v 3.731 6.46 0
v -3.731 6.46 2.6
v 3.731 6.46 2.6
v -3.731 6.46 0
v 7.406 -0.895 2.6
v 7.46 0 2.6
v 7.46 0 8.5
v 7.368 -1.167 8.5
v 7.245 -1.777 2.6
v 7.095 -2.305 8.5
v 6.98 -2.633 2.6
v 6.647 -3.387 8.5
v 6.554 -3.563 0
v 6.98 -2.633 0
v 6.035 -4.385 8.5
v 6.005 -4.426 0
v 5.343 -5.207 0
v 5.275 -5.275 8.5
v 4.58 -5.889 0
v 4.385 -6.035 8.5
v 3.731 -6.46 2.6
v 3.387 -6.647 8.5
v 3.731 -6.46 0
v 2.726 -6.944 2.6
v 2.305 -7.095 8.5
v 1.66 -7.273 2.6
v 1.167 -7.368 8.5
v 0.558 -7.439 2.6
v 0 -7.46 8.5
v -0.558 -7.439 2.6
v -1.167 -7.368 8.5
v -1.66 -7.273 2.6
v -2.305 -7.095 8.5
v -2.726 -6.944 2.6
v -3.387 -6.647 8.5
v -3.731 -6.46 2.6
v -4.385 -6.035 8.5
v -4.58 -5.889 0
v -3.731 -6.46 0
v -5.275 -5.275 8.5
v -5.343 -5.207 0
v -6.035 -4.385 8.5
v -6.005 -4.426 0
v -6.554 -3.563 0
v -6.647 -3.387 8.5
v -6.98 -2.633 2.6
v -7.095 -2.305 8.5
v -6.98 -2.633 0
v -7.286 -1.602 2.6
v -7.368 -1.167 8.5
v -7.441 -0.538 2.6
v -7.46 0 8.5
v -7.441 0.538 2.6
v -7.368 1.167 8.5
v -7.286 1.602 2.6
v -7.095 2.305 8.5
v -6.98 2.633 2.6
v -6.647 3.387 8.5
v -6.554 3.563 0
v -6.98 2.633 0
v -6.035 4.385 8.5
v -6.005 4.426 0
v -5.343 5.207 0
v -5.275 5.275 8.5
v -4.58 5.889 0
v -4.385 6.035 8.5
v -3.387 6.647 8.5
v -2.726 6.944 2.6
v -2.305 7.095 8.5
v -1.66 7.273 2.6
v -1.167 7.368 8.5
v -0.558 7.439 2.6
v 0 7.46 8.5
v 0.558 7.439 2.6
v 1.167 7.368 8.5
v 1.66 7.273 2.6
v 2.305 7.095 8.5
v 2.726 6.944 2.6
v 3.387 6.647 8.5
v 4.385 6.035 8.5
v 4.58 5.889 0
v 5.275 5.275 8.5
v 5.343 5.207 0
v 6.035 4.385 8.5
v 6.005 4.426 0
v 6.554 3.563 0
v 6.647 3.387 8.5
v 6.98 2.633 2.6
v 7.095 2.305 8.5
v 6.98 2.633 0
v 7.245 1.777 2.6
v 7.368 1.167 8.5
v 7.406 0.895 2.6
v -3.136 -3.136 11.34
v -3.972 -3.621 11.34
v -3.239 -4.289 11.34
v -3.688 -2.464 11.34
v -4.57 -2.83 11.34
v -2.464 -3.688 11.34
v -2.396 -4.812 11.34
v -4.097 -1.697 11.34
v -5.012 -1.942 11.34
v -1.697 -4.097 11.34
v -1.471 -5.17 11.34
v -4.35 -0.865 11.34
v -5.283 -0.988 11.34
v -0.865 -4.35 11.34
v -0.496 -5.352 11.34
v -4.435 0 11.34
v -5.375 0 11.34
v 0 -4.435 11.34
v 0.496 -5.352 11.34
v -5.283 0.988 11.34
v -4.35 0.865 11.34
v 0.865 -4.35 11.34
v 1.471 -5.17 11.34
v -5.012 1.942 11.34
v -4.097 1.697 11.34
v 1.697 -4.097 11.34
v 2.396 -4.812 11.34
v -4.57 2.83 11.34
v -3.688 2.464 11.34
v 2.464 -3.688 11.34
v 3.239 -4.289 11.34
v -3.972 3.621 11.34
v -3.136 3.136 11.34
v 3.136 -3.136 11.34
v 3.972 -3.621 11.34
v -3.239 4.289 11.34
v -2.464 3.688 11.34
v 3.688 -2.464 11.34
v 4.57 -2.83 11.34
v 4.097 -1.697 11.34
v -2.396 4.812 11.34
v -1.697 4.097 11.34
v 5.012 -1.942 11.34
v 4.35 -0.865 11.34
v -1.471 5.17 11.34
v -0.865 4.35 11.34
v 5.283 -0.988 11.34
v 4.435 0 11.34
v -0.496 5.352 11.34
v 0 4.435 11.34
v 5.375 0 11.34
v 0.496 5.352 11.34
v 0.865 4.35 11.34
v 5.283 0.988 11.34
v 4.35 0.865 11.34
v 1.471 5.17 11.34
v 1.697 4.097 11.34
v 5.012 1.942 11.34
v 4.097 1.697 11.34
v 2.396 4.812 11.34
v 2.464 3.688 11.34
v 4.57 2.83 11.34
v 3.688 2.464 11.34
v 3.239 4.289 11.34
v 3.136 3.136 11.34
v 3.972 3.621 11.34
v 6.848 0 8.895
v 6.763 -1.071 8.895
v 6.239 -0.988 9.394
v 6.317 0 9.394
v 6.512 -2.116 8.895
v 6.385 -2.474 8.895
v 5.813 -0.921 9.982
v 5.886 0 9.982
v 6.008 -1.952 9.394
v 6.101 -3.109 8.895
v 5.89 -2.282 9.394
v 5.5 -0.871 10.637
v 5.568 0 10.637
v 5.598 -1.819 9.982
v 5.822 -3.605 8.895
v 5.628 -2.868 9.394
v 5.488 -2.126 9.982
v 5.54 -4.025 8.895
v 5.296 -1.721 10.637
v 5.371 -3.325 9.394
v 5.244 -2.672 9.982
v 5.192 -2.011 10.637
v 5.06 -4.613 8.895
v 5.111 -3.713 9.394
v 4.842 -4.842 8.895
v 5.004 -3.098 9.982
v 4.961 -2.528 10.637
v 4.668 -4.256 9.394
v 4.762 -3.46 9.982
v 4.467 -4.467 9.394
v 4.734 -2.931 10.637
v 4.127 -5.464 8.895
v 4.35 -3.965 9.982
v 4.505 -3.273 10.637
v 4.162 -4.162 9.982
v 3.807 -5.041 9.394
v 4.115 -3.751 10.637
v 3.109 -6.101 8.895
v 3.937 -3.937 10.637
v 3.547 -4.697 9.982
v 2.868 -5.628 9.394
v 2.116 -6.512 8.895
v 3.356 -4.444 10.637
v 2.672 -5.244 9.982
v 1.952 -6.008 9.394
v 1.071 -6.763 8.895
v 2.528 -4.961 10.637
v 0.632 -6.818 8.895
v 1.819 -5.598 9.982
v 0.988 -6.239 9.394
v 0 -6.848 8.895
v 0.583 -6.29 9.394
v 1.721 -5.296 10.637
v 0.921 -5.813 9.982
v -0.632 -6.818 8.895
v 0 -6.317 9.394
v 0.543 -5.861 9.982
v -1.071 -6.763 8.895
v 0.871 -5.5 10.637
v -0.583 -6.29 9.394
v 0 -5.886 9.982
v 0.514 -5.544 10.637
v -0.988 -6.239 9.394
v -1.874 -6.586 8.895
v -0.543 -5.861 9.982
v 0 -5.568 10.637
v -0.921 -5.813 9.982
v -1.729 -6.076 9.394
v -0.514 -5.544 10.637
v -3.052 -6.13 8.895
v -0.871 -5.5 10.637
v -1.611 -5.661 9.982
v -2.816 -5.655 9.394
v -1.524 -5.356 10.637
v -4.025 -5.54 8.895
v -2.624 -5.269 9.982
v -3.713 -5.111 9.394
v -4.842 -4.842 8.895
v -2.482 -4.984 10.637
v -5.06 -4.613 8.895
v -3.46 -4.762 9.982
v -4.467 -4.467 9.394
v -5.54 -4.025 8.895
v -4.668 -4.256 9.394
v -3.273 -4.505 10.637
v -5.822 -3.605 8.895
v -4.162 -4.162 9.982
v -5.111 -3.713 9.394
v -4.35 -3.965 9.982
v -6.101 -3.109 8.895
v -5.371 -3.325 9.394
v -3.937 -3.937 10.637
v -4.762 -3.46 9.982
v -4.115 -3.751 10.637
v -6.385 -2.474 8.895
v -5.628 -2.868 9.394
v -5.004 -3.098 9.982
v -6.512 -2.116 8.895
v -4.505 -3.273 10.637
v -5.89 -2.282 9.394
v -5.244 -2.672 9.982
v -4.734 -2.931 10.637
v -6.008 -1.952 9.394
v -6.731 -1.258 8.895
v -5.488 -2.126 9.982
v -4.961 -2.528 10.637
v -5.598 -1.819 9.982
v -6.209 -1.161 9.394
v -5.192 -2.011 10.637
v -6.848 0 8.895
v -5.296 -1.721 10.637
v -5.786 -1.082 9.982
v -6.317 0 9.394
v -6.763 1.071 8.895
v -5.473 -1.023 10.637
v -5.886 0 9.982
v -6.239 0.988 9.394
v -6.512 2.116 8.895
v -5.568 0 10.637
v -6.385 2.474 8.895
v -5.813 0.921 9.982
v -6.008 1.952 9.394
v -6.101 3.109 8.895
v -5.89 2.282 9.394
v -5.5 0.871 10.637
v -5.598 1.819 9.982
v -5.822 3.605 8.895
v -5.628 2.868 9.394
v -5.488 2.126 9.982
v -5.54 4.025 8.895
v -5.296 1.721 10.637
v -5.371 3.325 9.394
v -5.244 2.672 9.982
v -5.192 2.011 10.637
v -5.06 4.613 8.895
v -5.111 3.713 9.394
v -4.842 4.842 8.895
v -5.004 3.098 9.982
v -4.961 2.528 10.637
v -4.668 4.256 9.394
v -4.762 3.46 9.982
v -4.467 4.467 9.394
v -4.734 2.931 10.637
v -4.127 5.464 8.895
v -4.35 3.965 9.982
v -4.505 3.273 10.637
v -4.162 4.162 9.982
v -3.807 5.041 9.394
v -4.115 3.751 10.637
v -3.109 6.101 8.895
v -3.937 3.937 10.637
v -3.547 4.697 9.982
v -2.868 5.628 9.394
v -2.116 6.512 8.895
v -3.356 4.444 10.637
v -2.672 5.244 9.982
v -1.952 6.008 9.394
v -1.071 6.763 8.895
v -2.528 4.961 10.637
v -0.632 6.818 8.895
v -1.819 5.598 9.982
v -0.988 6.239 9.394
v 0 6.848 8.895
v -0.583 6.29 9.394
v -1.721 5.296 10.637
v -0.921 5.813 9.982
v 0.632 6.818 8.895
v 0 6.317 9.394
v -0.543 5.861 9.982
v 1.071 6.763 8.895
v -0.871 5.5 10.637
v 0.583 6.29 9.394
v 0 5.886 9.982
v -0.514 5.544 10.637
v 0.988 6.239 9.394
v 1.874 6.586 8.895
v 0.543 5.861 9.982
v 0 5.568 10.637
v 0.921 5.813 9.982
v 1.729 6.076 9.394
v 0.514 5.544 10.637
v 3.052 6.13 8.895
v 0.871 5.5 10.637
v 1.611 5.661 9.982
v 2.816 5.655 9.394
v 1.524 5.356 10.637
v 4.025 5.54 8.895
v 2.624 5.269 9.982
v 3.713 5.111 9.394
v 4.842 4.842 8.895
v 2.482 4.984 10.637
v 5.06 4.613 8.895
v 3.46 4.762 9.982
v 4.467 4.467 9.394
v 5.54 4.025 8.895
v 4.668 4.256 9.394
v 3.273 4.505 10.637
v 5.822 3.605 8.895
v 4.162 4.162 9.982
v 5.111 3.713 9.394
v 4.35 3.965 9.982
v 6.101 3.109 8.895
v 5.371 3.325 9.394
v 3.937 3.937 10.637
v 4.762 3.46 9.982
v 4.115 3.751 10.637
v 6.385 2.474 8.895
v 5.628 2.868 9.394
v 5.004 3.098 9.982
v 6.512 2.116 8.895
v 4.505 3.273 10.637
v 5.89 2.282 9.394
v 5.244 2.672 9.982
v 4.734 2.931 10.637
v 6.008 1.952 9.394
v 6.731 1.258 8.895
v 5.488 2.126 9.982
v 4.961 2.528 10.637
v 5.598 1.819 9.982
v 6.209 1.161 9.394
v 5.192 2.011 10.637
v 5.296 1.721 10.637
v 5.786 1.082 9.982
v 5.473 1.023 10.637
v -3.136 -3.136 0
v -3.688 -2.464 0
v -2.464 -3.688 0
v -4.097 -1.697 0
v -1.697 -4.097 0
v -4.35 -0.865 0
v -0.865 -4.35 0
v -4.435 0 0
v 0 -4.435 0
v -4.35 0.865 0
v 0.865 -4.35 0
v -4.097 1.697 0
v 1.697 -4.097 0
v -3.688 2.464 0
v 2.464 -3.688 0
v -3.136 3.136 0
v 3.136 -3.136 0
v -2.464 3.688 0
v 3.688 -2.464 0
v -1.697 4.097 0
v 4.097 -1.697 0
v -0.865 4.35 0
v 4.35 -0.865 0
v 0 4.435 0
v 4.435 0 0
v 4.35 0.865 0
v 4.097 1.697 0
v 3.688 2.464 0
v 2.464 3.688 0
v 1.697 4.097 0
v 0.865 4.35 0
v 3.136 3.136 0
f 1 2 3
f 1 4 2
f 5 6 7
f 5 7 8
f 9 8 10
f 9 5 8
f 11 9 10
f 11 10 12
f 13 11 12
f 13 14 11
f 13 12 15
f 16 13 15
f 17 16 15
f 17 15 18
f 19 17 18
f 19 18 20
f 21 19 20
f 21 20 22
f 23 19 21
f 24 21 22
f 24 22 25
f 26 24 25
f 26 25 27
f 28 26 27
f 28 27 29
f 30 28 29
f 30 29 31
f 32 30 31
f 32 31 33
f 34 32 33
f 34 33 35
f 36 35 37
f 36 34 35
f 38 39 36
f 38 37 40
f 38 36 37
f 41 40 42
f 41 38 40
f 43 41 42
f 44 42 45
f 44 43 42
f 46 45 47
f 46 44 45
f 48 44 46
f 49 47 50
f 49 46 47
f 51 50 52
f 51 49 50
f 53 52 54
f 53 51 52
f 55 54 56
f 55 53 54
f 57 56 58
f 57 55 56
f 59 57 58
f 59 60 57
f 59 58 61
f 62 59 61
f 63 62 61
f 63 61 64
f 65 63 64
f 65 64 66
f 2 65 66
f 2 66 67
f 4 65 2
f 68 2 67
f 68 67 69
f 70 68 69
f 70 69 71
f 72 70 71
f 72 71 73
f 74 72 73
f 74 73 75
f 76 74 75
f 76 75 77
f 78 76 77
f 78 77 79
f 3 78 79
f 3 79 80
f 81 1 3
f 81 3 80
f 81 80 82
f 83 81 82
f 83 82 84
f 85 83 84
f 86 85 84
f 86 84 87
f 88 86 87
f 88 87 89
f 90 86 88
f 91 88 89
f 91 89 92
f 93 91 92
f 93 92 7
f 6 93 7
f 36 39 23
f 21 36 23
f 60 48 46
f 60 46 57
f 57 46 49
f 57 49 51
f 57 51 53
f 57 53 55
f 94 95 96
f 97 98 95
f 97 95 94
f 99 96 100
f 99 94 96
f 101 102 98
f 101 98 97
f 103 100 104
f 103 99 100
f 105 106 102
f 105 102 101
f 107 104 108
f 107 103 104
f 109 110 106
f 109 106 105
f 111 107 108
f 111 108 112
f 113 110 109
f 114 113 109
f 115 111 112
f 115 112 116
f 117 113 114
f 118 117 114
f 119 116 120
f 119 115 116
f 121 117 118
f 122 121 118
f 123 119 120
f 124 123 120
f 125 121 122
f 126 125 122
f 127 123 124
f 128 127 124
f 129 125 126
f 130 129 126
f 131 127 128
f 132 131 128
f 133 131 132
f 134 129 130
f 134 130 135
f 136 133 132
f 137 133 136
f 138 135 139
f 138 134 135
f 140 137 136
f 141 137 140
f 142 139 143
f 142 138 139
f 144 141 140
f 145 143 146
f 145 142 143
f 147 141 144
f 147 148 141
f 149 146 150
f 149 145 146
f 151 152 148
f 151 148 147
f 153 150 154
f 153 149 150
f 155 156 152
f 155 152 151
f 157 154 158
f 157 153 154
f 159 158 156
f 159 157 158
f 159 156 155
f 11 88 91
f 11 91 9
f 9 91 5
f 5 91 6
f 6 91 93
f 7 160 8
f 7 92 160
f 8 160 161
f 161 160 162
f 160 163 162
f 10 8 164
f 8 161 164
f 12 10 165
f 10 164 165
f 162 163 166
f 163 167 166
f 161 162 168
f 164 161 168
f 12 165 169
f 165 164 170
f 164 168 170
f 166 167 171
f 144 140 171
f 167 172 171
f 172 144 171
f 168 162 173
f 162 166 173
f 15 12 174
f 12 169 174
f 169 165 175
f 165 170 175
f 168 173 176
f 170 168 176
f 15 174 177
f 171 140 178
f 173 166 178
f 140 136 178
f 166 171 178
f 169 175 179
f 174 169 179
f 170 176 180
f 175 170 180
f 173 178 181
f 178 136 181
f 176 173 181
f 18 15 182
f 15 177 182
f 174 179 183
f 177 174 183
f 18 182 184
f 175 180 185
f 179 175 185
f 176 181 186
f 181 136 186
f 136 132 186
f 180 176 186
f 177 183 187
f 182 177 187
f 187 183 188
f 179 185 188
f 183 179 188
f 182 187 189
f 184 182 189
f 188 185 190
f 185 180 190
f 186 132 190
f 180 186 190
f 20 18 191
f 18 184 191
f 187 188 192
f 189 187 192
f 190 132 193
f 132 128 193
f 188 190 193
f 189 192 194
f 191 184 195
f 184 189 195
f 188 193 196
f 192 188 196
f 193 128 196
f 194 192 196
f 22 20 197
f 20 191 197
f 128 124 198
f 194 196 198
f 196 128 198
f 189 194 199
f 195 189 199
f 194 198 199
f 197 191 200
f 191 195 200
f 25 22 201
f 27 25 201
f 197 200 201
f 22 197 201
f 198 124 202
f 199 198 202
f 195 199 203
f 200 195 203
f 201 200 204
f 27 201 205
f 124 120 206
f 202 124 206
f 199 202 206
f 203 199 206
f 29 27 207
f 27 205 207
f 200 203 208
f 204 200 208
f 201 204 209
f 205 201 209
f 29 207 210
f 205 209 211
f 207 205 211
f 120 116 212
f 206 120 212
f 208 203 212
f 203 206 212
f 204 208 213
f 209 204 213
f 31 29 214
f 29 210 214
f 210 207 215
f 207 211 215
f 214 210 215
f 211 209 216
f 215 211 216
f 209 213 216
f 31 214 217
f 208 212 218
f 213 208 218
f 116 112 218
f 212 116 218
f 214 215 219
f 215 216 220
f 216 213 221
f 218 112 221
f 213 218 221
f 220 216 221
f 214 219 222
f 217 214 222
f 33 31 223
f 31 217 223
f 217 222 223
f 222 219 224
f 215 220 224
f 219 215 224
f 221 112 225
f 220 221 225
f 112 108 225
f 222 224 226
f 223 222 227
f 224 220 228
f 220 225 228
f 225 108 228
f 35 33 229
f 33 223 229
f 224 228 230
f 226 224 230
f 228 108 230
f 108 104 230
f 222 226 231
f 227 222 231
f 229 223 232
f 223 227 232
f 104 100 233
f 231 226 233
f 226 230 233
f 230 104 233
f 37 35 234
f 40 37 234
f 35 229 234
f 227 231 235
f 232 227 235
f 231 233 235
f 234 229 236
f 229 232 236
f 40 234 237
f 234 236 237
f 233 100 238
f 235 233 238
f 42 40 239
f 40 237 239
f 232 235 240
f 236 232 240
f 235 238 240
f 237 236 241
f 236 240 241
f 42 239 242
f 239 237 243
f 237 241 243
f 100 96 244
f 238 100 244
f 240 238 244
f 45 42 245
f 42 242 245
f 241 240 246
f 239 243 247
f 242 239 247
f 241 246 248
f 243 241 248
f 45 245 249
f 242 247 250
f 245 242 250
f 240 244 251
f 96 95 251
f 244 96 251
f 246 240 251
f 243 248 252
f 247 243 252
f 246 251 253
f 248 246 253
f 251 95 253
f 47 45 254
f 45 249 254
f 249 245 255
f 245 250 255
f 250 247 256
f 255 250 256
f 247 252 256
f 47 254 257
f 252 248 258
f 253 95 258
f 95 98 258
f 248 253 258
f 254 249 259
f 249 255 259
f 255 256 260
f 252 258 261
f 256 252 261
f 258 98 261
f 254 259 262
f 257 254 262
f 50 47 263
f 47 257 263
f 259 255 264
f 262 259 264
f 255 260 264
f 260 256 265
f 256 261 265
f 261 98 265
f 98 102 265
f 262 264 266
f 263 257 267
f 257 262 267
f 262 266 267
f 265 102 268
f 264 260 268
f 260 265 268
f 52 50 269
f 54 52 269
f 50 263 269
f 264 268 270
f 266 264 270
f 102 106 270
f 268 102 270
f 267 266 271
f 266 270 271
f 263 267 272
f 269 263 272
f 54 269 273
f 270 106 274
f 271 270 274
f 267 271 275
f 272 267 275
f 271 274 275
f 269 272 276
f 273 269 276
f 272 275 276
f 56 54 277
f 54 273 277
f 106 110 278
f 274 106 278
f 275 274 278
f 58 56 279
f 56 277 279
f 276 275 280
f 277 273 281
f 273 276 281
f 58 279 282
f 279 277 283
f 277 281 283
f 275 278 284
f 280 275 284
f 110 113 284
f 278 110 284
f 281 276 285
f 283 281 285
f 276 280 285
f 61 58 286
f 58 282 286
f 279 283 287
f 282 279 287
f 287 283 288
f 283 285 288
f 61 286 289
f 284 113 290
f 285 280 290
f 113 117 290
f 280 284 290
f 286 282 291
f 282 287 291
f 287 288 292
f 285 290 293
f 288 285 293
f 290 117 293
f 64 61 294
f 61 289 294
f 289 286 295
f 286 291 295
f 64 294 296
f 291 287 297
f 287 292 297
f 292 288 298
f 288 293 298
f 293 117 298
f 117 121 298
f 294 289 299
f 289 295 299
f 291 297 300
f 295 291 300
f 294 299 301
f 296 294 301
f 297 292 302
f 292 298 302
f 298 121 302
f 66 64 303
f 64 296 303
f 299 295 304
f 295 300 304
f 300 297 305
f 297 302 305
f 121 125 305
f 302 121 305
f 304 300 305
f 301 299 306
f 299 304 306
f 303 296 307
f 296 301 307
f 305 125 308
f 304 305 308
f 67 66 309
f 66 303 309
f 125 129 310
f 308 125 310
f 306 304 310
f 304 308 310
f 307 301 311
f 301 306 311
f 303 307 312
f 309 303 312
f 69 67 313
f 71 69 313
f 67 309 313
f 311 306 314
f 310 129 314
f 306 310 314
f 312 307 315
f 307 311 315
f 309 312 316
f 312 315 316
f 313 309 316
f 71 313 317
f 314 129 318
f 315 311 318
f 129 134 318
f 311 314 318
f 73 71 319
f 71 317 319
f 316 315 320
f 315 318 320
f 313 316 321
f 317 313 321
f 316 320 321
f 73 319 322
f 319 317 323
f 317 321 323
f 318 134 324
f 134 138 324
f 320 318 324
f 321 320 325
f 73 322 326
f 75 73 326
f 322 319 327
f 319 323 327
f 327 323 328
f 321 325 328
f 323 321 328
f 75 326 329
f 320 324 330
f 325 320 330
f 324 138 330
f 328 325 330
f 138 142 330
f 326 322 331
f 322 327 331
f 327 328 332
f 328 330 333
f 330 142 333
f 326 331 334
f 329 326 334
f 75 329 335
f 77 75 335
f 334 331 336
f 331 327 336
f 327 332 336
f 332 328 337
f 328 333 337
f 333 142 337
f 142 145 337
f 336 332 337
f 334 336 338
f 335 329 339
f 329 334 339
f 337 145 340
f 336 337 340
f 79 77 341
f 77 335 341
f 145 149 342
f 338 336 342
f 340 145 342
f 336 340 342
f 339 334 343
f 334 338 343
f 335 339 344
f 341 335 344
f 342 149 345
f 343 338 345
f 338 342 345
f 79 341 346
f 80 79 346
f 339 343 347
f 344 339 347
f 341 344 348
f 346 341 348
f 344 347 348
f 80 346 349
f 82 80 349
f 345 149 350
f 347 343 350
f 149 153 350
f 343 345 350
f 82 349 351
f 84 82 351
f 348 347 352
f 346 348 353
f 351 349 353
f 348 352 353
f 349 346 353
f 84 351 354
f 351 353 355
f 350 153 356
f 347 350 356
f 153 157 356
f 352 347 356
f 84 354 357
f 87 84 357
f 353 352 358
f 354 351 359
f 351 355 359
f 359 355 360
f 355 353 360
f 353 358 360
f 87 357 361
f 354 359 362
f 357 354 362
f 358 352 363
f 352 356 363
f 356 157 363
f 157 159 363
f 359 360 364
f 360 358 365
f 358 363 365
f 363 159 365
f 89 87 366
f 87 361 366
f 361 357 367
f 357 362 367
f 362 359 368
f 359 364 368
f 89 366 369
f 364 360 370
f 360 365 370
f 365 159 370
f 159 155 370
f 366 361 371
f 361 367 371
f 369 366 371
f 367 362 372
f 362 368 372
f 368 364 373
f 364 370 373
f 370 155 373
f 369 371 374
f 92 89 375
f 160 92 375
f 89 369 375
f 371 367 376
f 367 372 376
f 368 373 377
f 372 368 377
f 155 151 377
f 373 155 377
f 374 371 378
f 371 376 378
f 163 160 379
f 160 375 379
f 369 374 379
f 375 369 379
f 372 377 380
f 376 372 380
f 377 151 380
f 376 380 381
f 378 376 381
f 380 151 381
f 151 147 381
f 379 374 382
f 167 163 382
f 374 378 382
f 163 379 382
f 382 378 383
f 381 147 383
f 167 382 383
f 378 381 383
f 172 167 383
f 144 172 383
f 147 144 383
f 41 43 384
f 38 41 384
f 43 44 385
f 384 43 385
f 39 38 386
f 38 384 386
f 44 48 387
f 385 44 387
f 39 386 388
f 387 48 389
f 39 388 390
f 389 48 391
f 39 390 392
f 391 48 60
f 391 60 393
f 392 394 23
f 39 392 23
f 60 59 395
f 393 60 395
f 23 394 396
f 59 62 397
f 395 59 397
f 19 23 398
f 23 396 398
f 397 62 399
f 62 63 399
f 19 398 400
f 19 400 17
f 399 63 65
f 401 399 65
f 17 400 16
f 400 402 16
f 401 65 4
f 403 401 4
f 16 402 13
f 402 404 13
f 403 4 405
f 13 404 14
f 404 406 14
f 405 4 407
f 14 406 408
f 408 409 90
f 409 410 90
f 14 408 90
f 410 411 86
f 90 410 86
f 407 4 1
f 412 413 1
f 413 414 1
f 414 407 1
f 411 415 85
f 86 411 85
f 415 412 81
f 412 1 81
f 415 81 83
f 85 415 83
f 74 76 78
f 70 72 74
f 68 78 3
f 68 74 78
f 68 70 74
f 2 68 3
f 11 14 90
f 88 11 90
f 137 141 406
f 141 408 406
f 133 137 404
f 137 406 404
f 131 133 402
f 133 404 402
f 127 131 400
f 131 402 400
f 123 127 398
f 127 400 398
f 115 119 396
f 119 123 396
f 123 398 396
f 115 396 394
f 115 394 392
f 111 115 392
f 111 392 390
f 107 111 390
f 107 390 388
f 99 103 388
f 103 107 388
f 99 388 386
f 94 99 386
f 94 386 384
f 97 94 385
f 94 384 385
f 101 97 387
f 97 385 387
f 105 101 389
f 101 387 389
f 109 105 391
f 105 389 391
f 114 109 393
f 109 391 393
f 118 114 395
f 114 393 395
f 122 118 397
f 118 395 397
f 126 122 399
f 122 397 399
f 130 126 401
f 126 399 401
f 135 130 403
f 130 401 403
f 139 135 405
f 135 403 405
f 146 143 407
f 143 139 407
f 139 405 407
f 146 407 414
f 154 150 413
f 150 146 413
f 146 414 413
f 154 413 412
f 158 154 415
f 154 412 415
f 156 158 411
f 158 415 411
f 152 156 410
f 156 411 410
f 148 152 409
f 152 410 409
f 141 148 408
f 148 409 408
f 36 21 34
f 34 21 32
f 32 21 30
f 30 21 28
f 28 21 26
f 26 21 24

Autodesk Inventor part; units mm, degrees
ref_plane "YZ Plane" through (0, 0, 0) normal (1, 0, 0) x (0, 1, 0)
ref_plane "XZ Plane" through (0, 0, 0) normal (0, 1, 0) x (-1, 0, 0)
ref_plane "XY Plane" through (0, 0, 0) normal (0, 0, 1) x (1, 0, 0)
sketch "Sketch1" plane through (0, 0, 0) normal (0, 0, 1) x (1, 0, 0)
  circle A0 centre (0, 0) radius 4.435
  circle A1 centre (0, 0) radius 7.46
  dimension "d0" = 8.87
  dimension "d1" = 14.92
extrude "Extrusion1" add sketch "Sketch1" along normal blind 11.34
sketch "Sketch2" plane through (0, 0, 0) normal (0, 1, 0) x (-1, 0, 0)
  line L0 (7.46, 11.34) -> (-7.46, 11.34) projected
  line L1 (-7.46, 0) -> (7.46, 0) projected
  line L2 (7.46, 11.34) -> (-7.46, 11.34) projected
  line L3 (0, 11.34) -> (-5.375, 11.34) construction
  line L4 (-7.46, 0) -> (-7.46, 8.5) construction
  line L5 (-7.46, 0) -> (-7.46, 11.34) projected
  arc A0 (-7.46, 8.5) -> (-5.375, 11.34) centre (-9.3123, 12.0453) ccw
  line L6 (-5.375, 11.34) -> (-7.46, 11.34)
  line L7 (-7.46, 11.34) -> (-7.46, 8.5)
  line L8 (0, 11.34) -> (0, 0)
  dimension "d4" = 5.375
  dimension "d5" = 8.5
  dimension "d6" = 4
revolve "Revolution1" cut sketch "Sketch2" angle 360 about axis through (0, 0, 11.34) along (0, 0, -1) contours A0 L5 L0
thread "Thread1" size "M9x1.25" class "6H" standard "ANSI Metric M Profile" full length
sketch "Sketch3" plane through (0, 0, 0) normal (0, 0, -1) x (-1, 0, 0)
  circle A0 centre (0, 0) radius 4.435 projected
  circle A1 centre (0, 0) radius 7.46 projected
  line L0 (3.731, -6.46) -> (-3.731, -6.46)
  line L1 (3.731, 6.46) -> (-3.731, 6.46)
  line L2 (6.98, -2.6327) -> (6.98, 2.6327)
  line L3 (-6.98, -2.6327) -> (-6.98, 2.6327)
  dimension "d10" = 12.92
  dimension "d11" = 6.46
  dimension "d12" = 13.96
  dimension "d13" = 6.98
extrude "Extrusion2" cut sketch "Sketch3" against normal blind 2.6 contours A1 L2 | L1 A1 | A1 L0 | L3 A1
equation "\"d11\" = 0.5 * d10"
equation "\"d13\" = 0.5 * d12"
properties part number "BallBearingCone"
